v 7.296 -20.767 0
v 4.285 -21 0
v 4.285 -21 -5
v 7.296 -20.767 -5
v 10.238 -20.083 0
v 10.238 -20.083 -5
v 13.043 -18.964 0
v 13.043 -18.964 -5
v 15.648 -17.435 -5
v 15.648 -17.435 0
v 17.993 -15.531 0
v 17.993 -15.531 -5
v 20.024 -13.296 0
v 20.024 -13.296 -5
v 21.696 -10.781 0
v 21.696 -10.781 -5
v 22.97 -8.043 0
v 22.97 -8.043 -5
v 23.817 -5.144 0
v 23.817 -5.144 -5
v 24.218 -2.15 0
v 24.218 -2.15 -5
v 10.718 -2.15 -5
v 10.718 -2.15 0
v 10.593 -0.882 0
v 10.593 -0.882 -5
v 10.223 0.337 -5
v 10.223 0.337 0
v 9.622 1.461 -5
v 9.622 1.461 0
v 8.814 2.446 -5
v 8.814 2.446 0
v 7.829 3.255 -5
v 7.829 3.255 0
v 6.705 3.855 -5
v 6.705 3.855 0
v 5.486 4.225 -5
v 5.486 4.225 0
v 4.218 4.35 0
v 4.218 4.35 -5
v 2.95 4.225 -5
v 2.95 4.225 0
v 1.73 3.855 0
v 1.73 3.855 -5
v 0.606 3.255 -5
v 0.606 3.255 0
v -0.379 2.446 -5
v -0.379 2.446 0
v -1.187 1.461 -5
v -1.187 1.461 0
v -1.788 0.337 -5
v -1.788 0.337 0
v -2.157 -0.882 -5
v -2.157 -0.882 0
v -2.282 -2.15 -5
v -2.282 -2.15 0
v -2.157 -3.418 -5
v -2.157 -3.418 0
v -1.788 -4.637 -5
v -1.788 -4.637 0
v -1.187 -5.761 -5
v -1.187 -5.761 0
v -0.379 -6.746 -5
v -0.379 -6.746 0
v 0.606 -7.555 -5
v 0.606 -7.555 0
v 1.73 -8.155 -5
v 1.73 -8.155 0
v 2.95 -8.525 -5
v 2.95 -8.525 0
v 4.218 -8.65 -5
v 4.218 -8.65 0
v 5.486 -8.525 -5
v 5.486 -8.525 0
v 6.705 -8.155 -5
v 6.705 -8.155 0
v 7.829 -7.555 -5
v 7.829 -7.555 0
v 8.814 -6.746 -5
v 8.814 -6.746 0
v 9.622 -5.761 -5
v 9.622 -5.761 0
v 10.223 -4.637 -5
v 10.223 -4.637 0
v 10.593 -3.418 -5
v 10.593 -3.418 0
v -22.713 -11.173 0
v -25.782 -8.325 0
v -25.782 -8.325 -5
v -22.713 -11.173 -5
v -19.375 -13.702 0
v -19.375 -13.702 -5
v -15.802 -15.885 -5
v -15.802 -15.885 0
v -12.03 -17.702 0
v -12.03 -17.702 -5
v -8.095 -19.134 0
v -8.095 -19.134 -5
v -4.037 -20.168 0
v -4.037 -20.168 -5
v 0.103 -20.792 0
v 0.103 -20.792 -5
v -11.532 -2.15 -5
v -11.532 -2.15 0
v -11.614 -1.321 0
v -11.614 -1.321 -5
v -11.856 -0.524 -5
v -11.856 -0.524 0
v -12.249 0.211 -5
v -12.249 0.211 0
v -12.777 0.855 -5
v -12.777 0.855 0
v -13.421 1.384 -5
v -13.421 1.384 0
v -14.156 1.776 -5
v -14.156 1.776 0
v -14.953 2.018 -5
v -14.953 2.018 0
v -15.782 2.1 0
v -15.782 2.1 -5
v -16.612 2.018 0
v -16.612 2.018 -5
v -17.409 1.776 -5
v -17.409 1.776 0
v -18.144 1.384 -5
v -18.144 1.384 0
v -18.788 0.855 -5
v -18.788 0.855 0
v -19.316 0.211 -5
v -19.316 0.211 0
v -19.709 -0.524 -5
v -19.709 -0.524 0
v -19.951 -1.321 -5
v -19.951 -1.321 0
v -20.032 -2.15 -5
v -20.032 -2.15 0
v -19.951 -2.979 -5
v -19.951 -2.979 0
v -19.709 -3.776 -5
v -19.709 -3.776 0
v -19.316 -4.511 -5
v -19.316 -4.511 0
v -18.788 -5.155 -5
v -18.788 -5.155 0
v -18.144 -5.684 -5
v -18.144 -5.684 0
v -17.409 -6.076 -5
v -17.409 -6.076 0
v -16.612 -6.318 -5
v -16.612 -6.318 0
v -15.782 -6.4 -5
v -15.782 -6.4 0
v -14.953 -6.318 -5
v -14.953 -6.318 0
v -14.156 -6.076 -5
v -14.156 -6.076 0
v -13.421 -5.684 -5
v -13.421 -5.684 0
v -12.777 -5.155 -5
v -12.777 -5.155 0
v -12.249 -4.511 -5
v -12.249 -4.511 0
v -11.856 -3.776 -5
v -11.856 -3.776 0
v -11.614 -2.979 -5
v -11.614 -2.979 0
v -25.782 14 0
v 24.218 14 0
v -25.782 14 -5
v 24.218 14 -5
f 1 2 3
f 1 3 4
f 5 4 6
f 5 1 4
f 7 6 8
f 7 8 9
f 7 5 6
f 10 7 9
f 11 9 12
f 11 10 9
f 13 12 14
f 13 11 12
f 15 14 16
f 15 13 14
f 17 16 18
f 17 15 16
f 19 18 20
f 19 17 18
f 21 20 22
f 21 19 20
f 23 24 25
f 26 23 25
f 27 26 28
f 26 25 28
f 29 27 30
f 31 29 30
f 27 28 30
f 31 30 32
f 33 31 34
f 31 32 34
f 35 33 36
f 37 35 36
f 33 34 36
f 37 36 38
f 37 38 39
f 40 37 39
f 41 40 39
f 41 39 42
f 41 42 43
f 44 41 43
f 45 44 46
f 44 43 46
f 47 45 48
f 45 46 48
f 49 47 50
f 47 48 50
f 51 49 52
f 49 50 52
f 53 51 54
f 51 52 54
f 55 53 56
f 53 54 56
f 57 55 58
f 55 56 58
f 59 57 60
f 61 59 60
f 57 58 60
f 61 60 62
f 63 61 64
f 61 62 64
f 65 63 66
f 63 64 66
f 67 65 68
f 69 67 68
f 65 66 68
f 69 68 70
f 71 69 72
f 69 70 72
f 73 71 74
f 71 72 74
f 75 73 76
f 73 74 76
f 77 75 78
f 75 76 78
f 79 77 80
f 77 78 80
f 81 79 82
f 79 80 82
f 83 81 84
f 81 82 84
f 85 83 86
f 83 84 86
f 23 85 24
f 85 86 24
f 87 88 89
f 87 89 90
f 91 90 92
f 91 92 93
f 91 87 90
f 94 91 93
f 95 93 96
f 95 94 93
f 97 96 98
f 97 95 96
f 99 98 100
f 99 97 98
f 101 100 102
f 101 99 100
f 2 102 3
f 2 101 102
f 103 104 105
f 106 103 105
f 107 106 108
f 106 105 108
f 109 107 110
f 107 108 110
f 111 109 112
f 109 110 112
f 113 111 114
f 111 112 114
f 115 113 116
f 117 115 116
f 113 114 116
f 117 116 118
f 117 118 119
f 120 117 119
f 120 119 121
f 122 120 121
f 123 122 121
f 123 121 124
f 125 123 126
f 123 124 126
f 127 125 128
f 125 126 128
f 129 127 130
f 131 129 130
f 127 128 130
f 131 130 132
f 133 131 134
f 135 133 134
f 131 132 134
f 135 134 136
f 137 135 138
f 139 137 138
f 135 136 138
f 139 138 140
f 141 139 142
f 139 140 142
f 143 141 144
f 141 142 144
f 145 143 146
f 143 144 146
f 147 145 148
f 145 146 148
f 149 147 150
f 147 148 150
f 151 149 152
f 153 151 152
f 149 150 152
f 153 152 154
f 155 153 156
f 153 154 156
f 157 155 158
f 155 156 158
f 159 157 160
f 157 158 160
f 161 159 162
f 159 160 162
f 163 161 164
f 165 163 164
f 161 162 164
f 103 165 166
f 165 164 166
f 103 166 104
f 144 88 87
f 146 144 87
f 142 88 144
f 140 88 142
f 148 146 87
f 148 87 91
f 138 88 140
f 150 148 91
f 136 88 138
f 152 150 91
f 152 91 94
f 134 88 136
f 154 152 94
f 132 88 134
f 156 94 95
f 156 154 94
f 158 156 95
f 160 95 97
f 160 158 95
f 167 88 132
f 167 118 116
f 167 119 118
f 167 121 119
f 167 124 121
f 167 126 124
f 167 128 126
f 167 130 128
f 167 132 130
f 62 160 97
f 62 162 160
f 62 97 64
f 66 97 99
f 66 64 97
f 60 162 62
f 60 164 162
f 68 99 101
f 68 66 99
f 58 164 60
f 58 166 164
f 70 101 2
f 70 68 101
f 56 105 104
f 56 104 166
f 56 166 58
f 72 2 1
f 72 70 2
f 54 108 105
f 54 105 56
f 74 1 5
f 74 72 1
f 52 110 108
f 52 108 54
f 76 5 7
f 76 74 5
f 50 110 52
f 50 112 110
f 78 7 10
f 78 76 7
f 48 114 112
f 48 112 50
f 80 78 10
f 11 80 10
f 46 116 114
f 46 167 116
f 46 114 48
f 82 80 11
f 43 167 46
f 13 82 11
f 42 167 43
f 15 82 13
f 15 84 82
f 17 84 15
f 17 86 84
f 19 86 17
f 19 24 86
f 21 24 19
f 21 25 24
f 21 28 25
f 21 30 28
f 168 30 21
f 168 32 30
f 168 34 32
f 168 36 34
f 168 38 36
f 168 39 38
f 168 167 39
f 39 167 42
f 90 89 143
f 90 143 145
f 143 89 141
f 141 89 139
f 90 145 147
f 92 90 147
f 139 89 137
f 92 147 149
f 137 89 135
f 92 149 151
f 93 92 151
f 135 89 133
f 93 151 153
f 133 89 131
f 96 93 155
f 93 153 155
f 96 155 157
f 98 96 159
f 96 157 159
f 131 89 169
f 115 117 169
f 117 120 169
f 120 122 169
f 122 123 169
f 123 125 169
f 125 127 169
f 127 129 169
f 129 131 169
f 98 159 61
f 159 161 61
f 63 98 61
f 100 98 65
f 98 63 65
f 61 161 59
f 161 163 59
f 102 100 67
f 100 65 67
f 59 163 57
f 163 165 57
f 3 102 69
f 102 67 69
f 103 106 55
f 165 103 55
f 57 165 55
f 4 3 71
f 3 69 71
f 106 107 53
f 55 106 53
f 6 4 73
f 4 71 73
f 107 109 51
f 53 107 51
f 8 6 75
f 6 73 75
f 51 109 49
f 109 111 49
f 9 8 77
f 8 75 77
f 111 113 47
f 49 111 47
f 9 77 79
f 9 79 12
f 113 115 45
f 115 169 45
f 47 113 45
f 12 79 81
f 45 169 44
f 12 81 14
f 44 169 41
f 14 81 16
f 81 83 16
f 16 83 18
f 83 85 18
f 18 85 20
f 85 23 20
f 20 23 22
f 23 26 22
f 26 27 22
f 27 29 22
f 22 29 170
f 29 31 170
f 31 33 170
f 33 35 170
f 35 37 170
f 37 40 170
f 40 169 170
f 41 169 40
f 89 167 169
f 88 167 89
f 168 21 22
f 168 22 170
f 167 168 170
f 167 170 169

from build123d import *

# Parameters (mm, degrees)
F0_R     = 4.25
F0_R_2   = 11.5
F0_R_3   = 6.5
F1_DEPTH = 5


with BuildPart() as f1:
    # F0 (on Top) → F1 (new body)
    with BuildSketch(Plane.XY):
        with BuildLine():
            Line((24.217633, -2.15), (24.217633, 14))
            Line((24.217633, 14), (-15.781855, 14))
            Line((-15.781855, 14), (-25.782367, 14))
            Line((-25.782367, 14), (-25.782367, -8.325128))
            ThreePointArc((-25.782367, -8.325128), (-12.029825, -17.702051), (4.285203, -21.000373))
            ThreePointArc((4.285203, -21.000373), (17.992916, -15.531456), (24.217633, -2.15))
        make_face()
        with Locations((-15.782367, -2.15)):
            Circle(F0_R, mode=Mode.SUBTRACT)
        with Locations((4.217633, -2.15)):
            Circle(F0_R_2, mode=Mode.SUBTRACT)
        with Locations((4.217633, -2.15)):
            Circle(F0_R_2)
        with Locations((4.217633, -2.15)):
            Circle(F0_R_3, mode=Mode.SUBTRACT)
    extrude(amount=-F1_DEPTH)


solid = f1.part
